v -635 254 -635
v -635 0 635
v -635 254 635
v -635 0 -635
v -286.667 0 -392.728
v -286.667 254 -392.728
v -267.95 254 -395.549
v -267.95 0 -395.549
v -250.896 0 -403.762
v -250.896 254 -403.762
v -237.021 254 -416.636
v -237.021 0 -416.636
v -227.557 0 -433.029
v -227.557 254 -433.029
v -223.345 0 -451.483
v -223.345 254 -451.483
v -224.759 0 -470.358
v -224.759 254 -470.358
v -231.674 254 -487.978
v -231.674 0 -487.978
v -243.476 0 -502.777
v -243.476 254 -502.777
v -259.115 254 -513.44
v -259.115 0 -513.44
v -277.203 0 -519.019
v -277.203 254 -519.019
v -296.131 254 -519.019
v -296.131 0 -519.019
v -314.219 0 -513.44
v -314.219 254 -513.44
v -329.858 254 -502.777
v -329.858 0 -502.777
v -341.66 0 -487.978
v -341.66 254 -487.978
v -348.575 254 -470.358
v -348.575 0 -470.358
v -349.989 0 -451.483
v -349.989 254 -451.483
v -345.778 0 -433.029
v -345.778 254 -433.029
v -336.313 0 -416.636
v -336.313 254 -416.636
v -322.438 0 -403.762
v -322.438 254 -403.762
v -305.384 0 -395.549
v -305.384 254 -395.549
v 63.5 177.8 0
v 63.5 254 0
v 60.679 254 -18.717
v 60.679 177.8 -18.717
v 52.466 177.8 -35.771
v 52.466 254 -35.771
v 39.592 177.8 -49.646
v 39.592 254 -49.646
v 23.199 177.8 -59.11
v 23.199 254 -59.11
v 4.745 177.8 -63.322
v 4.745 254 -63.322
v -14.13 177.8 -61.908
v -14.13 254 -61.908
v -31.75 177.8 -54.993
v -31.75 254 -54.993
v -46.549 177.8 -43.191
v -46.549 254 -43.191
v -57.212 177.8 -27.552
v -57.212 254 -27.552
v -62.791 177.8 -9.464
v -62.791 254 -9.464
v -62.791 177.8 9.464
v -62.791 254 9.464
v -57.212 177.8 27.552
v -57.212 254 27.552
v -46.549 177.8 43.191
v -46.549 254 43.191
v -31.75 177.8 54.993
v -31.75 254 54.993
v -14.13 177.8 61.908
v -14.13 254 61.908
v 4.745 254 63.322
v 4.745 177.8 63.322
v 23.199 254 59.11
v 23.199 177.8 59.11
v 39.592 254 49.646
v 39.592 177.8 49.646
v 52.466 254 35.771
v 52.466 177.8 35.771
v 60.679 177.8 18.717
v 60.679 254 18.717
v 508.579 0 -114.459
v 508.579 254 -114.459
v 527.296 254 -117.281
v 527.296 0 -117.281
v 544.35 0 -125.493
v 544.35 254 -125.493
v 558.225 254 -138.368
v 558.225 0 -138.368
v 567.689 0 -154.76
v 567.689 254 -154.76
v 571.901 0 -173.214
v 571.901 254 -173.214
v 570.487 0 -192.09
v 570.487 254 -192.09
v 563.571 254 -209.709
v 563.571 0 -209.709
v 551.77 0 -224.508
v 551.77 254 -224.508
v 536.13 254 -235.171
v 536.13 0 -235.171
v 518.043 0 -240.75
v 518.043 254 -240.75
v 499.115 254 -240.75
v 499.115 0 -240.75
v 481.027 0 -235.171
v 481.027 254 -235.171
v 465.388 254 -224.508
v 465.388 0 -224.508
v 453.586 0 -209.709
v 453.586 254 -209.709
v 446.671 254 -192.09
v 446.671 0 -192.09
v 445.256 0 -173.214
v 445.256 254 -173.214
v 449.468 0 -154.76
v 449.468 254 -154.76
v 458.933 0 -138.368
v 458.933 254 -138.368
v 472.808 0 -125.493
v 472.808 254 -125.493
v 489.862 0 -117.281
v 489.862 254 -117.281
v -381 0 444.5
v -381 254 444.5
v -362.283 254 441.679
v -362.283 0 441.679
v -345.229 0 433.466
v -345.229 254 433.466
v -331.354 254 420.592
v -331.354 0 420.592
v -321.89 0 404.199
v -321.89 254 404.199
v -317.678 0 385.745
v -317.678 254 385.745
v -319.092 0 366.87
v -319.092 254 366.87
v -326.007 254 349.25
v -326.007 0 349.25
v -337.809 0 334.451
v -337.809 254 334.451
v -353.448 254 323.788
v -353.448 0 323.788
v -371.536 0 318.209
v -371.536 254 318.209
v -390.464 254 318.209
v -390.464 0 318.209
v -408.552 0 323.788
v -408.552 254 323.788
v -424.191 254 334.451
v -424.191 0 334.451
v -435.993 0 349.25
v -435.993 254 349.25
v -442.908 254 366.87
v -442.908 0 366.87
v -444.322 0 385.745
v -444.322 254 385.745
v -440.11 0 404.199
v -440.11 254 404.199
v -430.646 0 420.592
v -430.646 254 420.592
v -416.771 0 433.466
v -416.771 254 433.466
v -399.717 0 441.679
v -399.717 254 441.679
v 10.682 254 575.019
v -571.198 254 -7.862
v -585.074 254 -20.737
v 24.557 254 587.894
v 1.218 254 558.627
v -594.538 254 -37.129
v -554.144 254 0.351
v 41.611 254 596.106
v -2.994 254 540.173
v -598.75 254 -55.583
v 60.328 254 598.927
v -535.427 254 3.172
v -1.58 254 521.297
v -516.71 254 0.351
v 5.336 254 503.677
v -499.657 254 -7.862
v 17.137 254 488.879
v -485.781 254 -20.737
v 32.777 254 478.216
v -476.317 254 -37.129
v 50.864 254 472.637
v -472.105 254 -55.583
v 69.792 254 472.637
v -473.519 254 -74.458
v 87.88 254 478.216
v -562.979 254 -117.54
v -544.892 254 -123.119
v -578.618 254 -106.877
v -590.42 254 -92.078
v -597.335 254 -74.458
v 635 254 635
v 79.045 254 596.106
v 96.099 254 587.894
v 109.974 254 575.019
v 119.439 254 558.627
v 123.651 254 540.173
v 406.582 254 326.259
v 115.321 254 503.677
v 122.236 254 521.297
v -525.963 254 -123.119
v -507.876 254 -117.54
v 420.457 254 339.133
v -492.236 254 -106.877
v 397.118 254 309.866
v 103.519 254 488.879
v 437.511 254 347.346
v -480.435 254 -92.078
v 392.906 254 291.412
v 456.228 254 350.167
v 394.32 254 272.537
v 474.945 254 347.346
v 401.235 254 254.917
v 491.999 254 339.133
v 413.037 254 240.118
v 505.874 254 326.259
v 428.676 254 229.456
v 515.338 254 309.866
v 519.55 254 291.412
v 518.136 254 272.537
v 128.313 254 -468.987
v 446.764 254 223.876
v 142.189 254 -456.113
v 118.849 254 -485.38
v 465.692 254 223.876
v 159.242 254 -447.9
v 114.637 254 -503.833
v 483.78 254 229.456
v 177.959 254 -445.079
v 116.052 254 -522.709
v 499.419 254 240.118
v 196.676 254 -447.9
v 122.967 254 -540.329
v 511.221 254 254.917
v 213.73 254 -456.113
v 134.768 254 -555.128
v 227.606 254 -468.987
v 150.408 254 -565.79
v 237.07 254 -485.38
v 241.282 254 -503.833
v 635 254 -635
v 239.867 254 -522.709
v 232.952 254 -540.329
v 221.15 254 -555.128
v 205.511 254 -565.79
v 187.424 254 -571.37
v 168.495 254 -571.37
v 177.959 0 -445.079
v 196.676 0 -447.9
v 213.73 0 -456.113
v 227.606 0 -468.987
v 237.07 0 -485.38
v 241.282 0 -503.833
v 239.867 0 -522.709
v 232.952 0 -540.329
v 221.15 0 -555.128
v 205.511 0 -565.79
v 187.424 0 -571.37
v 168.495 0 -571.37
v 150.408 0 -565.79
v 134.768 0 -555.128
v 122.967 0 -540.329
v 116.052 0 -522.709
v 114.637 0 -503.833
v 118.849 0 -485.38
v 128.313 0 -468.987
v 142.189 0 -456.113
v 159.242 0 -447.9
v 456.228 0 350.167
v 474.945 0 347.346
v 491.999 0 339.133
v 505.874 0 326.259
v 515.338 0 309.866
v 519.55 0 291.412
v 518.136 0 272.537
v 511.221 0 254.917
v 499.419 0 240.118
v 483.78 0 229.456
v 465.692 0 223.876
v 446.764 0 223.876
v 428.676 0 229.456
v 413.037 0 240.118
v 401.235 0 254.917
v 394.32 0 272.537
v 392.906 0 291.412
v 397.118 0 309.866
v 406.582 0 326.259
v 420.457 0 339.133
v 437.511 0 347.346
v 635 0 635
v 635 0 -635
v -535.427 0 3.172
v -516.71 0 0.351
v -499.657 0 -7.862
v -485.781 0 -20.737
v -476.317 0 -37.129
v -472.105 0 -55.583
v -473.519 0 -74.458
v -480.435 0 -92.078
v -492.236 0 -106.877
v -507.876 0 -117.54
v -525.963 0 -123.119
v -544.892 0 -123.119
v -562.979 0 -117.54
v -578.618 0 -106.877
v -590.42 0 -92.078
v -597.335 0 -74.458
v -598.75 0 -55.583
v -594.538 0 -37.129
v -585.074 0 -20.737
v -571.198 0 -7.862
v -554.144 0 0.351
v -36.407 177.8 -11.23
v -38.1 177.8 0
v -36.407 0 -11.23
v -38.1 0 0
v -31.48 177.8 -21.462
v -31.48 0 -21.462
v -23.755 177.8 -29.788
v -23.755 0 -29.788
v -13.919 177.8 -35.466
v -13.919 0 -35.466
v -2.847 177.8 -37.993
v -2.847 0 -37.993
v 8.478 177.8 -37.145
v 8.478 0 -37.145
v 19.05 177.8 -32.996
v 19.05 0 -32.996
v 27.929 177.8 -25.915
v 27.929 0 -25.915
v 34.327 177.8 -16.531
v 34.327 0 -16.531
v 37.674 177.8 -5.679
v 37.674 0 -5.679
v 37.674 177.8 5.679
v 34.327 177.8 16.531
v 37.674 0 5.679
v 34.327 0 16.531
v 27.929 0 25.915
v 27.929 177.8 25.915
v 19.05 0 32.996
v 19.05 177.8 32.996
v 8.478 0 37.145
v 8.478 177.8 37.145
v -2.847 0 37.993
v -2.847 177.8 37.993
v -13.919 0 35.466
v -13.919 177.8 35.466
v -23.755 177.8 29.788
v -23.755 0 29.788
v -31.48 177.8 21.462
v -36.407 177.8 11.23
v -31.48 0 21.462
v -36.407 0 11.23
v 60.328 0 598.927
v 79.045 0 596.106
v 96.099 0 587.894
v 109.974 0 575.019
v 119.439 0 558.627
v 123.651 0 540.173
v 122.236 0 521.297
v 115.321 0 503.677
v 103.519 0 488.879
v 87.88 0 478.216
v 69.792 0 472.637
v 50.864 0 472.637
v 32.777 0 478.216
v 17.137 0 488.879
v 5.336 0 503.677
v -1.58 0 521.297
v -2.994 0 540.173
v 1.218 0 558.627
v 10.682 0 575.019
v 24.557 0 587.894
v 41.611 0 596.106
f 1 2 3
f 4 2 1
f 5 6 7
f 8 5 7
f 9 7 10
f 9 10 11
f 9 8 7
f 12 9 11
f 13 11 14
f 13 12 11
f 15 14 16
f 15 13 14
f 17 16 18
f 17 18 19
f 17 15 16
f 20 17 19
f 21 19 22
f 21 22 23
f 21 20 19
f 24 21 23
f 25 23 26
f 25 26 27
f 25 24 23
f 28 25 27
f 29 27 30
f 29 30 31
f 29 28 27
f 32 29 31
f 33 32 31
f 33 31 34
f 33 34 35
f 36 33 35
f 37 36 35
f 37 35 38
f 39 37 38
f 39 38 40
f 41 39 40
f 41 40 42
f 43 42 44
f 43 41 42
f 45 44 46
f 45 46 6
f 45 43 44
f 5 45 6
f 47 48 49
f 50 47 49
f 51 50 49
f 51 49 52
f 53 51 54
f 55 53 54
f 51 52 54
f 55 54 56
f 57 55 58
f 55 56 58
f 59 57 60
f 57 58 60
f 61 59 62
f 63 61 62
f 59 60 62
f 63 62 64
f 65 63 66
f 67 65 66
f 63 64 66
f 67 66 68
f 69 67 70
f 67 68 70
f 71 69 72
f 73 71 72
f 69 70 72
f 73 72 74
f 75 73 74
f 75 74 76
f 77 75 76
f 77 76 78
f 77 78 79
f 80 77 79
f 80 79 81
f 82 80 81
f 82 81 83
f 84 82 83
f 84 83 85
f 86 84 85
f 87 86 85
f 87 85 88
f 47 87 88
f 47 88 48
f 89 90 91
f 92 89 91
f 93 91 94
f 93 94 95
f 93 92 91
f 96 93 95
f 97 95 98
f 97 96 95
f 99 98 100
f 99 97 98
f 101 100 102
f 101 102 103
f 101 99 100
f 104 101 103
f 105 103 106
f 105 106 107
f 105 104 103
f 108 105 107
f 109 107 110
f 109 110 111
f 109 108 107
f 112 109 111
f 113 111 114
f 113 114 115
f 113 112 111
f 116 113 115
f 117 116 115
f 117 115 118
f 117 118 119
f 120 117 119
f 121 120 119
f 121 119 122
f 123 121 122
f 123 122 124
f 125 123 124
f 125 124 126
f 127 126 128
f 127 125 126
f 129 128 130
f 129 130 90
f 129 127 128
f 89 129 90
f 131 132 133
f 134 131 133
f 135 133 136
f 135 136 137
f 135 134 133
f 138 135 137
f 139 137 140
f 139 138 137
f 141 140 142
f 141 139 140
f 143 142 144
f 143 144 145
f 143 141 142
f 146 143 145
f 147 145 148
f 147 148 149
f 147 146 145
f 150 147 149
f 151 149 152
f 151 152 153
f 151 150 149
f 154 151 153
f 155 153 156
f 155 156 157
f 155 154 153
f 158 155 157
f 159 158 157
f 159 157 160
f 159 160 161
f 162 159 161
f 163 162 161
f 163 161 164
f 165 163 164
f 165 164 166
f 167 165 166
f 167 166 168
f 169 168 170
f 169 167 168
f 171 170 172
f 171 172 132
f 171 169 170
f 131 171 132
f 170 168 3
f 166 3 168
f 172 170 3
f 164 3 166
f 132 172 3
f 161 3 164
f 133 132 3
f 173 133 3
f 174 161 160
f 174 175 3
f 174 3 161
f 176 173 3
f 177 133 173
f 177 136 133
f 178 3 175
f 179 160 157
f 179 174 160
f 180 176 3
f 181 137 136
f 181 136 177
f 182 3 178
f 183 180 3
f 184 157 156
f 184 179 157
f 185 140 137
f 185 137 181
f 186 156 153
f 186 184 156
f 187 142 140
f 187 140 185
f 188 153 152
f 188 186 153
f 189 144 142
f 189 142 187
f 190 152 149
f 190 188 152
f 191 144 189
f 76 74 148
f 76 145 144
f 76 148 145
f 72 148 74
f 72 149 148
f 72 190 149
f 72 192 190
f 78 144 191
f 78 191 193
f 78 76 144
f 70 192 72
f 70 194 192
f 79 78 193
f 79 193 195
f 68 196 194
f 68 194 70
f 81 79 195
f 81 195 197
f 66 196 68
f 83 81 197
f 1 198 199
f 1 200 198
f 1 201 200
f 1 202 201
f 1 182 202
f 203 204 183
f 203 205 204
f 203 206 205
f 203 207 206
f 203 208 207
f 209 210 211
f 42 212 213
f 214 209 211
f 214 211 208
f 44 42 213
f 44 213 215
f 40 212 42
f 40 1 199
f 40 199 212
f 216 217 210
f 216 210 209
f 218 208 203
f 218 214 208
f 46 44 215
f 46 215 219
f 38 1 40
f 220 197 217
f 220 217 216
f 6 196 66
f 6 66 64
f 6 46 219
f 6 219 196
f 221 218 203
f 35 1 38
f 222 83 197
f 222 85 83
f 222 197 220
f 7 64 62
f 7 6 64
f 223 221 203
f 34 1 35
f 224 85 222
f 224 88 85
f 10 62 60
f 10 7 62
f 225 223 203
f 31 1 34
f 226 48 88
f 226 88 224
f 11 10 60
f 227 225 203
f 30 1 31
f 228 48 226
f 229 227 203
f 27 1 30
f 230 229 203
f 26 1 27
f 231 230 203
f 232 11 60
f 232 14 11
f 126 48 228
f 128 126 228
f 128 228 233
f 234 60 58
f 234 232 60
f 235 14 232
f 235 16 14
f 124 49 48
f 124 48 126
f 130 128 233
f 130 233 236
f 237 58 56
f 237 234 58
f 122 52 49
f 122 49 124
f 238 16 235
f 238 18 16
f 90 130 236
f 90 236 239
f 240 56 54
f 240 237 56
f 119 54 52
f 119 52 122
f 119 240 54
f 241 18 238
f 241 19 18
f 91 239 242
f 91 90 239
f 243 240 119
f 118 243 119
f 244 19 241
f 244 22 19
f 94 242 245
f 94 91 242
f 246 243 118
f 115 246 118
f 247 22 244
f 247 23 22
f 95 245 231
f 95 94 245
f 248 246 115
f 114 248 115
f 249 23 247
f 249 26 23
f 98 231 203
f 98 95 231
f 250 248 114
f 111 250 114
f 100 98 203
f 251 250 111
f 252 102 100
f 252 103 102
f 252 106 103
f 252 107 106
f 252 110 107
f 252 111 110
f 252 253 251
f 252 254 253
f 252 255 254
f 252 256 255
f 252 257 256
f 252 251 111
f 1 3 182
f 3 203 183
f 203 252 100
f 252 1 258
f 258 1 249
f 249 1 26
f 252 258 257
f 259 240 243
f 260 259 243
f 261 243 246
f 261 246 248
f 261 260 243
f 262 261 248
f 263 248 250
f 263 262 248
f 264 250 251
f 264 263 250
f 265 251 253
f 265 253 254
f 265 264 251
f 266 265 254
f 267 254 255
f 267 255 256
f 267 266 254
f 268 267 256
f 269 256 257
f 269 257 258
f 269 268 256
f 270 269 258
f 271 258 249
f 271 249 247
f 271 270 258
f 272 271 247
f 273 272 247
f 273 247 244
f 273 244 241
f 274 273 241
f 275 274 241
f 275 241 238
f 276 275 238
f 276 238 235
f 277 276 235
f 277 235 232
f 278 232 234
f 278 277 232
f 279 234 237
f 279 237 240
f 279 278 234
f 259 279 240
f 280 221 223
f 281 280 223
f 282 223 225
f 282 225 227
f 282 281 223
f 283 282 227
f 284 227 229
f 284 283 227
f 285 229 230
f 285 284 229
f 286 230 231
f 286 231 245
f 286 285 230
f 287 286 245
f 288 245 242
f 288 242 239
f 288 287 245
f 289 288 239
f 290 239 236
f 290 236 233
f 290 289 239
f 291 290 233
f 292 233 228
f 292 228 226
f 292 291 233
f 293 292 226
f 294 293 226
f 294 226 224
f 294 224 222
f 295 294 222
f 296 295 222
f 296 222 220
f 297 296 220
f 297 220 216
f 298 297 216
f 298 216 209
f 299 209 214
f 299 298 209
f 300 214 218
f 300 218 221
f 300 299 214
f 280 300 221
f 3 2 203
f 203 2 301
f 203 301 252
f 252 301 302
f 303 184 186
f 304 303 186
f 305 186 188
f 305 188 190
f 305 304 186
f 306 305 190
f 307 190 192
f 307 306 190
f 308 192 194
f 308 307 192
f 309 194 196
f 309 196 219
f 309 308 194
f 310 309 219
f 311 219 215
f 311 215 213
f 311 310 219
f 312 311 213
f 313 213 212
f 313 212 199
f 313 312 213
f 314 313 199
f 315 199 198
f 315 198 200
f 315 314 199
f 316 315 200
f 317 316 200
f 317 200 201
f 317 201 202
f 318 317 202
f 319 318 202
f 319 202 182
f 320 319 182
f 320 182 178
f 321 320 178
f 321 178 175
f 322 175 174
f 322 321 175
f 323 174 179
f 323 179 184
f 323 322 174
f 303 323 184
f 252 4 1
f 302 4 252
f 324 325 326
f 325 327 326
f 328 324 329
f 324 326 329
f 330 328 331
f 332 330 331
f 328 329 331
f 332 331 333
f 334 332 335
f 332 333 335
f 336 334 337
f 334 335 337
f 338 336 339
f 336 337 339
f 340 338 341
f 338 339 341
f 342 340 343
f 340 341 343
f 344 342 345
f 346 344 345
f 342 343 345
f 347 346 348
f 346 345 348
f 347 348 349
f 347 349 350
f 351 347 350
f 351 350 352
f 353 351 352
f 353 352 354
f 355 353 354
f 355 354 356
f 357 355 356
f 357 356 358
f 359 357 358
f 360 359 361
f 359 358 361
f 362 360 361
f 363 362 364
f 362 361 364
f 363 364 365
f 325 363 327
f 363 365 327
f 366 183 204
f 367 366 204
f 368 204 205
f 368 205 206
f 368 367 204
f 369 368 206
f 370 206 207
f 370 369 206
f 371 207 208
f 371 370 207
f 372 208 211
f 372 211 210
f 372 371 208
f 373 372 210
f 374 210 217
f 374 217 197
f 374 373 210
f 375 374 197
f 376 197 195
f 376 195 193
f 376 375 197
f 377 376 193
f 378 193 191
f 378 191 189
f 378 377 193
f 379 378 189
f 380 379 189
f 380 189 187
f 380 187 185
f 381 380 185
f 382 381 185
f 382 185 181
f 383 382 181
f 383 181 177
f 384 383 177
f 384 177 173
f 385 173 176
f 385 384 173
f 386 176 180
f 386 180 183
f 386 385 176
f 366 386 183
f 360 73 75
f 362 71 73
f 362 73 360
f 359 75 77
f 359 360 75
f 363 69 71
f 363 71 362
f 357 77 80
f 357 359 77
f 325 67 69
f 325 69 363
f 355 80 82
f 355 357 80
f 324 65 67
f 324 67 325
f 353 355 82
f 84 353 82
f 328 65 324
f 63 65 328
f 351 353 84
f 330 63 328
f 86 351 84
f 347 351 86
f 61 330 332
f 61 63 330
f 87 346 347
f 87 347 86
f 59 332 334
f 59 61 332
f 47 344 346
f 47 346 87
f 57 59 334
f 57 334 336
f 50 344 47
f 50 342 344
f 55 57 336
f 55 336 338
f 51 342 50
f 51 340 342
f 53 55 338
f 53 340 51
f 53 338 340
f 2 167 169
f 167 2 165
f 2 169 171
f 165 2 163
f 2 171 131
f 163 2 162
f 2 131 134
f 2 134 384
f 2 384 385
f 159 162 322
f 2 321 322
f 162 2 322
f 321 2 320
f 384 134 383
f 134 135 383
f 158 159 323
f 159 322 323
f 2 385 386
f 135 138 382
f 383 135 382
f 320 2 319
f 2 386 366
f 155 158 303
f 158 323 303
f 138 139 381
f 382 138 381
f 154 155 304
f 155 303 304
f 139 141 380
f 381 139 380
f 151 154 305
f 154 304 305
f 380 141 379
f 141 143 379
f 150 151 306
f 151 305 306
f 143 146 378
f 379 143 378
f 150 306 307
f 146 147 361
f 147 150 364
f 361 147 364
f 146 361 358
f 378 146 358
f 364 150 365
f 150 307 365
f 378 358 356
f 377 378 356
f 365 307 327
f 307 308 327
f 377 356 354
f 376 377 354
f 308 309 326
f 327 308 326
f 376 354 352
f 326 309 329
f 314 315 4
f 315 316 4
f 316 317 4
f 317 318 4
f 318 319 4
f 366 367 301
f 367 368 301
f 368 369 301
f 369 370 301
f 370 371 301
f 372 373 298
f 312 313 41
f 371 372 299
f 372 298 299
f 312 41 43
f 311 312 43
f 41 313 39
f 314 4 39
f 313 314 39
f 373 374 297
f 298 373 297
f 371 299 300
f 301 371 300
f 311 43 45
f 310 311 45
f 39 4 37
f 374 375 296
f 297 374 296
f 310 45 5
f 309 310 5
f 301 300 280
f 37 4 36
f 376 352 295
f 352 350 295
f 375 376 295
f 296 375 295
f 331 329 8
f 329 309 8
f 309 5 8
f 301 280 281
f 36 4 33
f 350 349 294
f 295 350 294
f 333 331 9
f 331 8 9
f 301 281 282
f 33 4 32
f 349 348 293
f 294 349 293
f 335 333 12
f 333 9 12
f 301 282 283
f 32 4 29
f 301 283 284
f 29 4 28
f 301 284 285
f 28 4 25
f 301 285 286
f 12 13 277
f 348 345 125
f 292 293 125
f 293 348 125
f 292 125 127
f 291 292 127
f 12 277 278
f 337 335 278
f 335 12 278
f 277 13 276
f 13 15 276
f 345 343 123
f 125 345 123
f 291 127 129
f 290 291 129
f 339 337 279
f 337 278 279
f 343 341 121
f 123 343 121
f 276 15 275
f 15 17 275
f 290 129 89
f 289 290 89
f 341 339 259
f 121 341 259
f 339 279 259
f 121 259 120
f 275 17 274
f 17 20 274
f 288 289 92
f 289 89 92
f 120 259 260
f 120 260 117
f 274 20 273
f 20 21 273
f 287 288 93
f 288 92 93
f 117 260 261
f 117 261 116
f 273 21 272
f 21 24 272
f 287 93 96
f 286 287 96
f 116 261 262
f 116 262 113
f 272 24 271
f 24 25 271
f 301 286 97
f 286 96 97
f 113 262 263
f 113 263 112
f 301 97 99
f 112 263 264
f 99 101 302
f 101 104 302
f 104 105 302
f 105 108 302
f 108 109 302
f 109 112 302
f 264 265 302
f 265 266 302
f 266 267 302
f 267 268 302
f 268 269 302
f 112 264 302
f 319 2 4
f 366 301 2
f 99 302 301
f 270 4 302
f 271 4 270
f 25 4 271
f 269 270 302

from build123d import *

# Parameters (mm, degrees)
SKETCH1_W                                           = 1270
SKETCH1_H                                           = 1270
SKETCH1_R                                           = 63.5
BOSS_EXTRUDE1_DEPTH                                 = 254
CBORE_FOR_00_BINDING_HEAD_MACHINE_SCREW_D           = 76.2
CBORE_FOR_00_BINDING_HEAD_MACHINE_SCREW_CBORE_D     = 127
CBORE_FOR_00_BINDING_HEAD_MACHINE_SCREW_CBORE_DEPTH = 76.2


with BuildPart() as part:
    # Sketch1 → Boss-Extrude1 (new body)
    with BuildSketch(Plane(origin=(0, 0, 0), x_dir=(1, 0, 0), z_dir=(0, 1, 0))):
        Rectangle(SKETCH1_W, SKETCH1_H)
        with Locations(Location((-381, -381, 0), (0, 0, 270))):
            Circle(SKETCH1_R, mode=Mode.SUBTRACT)
        with Locations(Location((-535.427409328, 60.328180312, 0), (0, 0, 270))):
            Circle(SKETCH1_R, mode=Mode.SUBTRACT)
        with Locations(Location((-286.667058704, 456.228010379, 0), (0, 0, 270))):
            Circle(SKETCH1_R, mode=Mode.SUBTRACT)
        with Locations(Location((177.959434067, 508.578843275, 0), (0, 0, 270))):
            Circle(SKETCH1_R, mode=Mode.SUBTRACT)
        with Locations(Location((508.578843275, 177.959434067, 0), (0, 0, 270))):
            Circle(SKETCH1_R, mode=Mode.SUBTRACT)
        with Locations(Location((456.228010379, -286.667058704, 0), (0, 0, 270))):
            Circle(SKETCH1_R, mode=Mode.SUBTRACT)
        with Locations(Location((60.328180312, -535.427409328, 0), (0, 0, 270))):
            Circle(SKETCH1_R, mode=Mode.SUBTRACT)
    extrude(amount=BOSS_EXTRUDE1_DEPTH)

    # CBORE for #00 Binding Head Machine Screw1 (through all)
    with Locations(Plane(origin=(0, 254, 0), x_dir=(1, 0, 0), z_dir=(0, 1, 0))):
        with Locations((0, 0)):
            CounterBoreHole(CBORE_FOR_00_BINDING_HEAD_MACHINE_SCREW_D / 2, CBORE_FOR_00_BINDING_HEAD_MACHINE_SCREW_CBORE_D / 2, CBORE_FOR_00_BINDING_HEAD_MACHINE_SCREW_CBORE_DEPTH)


solid = part.part
